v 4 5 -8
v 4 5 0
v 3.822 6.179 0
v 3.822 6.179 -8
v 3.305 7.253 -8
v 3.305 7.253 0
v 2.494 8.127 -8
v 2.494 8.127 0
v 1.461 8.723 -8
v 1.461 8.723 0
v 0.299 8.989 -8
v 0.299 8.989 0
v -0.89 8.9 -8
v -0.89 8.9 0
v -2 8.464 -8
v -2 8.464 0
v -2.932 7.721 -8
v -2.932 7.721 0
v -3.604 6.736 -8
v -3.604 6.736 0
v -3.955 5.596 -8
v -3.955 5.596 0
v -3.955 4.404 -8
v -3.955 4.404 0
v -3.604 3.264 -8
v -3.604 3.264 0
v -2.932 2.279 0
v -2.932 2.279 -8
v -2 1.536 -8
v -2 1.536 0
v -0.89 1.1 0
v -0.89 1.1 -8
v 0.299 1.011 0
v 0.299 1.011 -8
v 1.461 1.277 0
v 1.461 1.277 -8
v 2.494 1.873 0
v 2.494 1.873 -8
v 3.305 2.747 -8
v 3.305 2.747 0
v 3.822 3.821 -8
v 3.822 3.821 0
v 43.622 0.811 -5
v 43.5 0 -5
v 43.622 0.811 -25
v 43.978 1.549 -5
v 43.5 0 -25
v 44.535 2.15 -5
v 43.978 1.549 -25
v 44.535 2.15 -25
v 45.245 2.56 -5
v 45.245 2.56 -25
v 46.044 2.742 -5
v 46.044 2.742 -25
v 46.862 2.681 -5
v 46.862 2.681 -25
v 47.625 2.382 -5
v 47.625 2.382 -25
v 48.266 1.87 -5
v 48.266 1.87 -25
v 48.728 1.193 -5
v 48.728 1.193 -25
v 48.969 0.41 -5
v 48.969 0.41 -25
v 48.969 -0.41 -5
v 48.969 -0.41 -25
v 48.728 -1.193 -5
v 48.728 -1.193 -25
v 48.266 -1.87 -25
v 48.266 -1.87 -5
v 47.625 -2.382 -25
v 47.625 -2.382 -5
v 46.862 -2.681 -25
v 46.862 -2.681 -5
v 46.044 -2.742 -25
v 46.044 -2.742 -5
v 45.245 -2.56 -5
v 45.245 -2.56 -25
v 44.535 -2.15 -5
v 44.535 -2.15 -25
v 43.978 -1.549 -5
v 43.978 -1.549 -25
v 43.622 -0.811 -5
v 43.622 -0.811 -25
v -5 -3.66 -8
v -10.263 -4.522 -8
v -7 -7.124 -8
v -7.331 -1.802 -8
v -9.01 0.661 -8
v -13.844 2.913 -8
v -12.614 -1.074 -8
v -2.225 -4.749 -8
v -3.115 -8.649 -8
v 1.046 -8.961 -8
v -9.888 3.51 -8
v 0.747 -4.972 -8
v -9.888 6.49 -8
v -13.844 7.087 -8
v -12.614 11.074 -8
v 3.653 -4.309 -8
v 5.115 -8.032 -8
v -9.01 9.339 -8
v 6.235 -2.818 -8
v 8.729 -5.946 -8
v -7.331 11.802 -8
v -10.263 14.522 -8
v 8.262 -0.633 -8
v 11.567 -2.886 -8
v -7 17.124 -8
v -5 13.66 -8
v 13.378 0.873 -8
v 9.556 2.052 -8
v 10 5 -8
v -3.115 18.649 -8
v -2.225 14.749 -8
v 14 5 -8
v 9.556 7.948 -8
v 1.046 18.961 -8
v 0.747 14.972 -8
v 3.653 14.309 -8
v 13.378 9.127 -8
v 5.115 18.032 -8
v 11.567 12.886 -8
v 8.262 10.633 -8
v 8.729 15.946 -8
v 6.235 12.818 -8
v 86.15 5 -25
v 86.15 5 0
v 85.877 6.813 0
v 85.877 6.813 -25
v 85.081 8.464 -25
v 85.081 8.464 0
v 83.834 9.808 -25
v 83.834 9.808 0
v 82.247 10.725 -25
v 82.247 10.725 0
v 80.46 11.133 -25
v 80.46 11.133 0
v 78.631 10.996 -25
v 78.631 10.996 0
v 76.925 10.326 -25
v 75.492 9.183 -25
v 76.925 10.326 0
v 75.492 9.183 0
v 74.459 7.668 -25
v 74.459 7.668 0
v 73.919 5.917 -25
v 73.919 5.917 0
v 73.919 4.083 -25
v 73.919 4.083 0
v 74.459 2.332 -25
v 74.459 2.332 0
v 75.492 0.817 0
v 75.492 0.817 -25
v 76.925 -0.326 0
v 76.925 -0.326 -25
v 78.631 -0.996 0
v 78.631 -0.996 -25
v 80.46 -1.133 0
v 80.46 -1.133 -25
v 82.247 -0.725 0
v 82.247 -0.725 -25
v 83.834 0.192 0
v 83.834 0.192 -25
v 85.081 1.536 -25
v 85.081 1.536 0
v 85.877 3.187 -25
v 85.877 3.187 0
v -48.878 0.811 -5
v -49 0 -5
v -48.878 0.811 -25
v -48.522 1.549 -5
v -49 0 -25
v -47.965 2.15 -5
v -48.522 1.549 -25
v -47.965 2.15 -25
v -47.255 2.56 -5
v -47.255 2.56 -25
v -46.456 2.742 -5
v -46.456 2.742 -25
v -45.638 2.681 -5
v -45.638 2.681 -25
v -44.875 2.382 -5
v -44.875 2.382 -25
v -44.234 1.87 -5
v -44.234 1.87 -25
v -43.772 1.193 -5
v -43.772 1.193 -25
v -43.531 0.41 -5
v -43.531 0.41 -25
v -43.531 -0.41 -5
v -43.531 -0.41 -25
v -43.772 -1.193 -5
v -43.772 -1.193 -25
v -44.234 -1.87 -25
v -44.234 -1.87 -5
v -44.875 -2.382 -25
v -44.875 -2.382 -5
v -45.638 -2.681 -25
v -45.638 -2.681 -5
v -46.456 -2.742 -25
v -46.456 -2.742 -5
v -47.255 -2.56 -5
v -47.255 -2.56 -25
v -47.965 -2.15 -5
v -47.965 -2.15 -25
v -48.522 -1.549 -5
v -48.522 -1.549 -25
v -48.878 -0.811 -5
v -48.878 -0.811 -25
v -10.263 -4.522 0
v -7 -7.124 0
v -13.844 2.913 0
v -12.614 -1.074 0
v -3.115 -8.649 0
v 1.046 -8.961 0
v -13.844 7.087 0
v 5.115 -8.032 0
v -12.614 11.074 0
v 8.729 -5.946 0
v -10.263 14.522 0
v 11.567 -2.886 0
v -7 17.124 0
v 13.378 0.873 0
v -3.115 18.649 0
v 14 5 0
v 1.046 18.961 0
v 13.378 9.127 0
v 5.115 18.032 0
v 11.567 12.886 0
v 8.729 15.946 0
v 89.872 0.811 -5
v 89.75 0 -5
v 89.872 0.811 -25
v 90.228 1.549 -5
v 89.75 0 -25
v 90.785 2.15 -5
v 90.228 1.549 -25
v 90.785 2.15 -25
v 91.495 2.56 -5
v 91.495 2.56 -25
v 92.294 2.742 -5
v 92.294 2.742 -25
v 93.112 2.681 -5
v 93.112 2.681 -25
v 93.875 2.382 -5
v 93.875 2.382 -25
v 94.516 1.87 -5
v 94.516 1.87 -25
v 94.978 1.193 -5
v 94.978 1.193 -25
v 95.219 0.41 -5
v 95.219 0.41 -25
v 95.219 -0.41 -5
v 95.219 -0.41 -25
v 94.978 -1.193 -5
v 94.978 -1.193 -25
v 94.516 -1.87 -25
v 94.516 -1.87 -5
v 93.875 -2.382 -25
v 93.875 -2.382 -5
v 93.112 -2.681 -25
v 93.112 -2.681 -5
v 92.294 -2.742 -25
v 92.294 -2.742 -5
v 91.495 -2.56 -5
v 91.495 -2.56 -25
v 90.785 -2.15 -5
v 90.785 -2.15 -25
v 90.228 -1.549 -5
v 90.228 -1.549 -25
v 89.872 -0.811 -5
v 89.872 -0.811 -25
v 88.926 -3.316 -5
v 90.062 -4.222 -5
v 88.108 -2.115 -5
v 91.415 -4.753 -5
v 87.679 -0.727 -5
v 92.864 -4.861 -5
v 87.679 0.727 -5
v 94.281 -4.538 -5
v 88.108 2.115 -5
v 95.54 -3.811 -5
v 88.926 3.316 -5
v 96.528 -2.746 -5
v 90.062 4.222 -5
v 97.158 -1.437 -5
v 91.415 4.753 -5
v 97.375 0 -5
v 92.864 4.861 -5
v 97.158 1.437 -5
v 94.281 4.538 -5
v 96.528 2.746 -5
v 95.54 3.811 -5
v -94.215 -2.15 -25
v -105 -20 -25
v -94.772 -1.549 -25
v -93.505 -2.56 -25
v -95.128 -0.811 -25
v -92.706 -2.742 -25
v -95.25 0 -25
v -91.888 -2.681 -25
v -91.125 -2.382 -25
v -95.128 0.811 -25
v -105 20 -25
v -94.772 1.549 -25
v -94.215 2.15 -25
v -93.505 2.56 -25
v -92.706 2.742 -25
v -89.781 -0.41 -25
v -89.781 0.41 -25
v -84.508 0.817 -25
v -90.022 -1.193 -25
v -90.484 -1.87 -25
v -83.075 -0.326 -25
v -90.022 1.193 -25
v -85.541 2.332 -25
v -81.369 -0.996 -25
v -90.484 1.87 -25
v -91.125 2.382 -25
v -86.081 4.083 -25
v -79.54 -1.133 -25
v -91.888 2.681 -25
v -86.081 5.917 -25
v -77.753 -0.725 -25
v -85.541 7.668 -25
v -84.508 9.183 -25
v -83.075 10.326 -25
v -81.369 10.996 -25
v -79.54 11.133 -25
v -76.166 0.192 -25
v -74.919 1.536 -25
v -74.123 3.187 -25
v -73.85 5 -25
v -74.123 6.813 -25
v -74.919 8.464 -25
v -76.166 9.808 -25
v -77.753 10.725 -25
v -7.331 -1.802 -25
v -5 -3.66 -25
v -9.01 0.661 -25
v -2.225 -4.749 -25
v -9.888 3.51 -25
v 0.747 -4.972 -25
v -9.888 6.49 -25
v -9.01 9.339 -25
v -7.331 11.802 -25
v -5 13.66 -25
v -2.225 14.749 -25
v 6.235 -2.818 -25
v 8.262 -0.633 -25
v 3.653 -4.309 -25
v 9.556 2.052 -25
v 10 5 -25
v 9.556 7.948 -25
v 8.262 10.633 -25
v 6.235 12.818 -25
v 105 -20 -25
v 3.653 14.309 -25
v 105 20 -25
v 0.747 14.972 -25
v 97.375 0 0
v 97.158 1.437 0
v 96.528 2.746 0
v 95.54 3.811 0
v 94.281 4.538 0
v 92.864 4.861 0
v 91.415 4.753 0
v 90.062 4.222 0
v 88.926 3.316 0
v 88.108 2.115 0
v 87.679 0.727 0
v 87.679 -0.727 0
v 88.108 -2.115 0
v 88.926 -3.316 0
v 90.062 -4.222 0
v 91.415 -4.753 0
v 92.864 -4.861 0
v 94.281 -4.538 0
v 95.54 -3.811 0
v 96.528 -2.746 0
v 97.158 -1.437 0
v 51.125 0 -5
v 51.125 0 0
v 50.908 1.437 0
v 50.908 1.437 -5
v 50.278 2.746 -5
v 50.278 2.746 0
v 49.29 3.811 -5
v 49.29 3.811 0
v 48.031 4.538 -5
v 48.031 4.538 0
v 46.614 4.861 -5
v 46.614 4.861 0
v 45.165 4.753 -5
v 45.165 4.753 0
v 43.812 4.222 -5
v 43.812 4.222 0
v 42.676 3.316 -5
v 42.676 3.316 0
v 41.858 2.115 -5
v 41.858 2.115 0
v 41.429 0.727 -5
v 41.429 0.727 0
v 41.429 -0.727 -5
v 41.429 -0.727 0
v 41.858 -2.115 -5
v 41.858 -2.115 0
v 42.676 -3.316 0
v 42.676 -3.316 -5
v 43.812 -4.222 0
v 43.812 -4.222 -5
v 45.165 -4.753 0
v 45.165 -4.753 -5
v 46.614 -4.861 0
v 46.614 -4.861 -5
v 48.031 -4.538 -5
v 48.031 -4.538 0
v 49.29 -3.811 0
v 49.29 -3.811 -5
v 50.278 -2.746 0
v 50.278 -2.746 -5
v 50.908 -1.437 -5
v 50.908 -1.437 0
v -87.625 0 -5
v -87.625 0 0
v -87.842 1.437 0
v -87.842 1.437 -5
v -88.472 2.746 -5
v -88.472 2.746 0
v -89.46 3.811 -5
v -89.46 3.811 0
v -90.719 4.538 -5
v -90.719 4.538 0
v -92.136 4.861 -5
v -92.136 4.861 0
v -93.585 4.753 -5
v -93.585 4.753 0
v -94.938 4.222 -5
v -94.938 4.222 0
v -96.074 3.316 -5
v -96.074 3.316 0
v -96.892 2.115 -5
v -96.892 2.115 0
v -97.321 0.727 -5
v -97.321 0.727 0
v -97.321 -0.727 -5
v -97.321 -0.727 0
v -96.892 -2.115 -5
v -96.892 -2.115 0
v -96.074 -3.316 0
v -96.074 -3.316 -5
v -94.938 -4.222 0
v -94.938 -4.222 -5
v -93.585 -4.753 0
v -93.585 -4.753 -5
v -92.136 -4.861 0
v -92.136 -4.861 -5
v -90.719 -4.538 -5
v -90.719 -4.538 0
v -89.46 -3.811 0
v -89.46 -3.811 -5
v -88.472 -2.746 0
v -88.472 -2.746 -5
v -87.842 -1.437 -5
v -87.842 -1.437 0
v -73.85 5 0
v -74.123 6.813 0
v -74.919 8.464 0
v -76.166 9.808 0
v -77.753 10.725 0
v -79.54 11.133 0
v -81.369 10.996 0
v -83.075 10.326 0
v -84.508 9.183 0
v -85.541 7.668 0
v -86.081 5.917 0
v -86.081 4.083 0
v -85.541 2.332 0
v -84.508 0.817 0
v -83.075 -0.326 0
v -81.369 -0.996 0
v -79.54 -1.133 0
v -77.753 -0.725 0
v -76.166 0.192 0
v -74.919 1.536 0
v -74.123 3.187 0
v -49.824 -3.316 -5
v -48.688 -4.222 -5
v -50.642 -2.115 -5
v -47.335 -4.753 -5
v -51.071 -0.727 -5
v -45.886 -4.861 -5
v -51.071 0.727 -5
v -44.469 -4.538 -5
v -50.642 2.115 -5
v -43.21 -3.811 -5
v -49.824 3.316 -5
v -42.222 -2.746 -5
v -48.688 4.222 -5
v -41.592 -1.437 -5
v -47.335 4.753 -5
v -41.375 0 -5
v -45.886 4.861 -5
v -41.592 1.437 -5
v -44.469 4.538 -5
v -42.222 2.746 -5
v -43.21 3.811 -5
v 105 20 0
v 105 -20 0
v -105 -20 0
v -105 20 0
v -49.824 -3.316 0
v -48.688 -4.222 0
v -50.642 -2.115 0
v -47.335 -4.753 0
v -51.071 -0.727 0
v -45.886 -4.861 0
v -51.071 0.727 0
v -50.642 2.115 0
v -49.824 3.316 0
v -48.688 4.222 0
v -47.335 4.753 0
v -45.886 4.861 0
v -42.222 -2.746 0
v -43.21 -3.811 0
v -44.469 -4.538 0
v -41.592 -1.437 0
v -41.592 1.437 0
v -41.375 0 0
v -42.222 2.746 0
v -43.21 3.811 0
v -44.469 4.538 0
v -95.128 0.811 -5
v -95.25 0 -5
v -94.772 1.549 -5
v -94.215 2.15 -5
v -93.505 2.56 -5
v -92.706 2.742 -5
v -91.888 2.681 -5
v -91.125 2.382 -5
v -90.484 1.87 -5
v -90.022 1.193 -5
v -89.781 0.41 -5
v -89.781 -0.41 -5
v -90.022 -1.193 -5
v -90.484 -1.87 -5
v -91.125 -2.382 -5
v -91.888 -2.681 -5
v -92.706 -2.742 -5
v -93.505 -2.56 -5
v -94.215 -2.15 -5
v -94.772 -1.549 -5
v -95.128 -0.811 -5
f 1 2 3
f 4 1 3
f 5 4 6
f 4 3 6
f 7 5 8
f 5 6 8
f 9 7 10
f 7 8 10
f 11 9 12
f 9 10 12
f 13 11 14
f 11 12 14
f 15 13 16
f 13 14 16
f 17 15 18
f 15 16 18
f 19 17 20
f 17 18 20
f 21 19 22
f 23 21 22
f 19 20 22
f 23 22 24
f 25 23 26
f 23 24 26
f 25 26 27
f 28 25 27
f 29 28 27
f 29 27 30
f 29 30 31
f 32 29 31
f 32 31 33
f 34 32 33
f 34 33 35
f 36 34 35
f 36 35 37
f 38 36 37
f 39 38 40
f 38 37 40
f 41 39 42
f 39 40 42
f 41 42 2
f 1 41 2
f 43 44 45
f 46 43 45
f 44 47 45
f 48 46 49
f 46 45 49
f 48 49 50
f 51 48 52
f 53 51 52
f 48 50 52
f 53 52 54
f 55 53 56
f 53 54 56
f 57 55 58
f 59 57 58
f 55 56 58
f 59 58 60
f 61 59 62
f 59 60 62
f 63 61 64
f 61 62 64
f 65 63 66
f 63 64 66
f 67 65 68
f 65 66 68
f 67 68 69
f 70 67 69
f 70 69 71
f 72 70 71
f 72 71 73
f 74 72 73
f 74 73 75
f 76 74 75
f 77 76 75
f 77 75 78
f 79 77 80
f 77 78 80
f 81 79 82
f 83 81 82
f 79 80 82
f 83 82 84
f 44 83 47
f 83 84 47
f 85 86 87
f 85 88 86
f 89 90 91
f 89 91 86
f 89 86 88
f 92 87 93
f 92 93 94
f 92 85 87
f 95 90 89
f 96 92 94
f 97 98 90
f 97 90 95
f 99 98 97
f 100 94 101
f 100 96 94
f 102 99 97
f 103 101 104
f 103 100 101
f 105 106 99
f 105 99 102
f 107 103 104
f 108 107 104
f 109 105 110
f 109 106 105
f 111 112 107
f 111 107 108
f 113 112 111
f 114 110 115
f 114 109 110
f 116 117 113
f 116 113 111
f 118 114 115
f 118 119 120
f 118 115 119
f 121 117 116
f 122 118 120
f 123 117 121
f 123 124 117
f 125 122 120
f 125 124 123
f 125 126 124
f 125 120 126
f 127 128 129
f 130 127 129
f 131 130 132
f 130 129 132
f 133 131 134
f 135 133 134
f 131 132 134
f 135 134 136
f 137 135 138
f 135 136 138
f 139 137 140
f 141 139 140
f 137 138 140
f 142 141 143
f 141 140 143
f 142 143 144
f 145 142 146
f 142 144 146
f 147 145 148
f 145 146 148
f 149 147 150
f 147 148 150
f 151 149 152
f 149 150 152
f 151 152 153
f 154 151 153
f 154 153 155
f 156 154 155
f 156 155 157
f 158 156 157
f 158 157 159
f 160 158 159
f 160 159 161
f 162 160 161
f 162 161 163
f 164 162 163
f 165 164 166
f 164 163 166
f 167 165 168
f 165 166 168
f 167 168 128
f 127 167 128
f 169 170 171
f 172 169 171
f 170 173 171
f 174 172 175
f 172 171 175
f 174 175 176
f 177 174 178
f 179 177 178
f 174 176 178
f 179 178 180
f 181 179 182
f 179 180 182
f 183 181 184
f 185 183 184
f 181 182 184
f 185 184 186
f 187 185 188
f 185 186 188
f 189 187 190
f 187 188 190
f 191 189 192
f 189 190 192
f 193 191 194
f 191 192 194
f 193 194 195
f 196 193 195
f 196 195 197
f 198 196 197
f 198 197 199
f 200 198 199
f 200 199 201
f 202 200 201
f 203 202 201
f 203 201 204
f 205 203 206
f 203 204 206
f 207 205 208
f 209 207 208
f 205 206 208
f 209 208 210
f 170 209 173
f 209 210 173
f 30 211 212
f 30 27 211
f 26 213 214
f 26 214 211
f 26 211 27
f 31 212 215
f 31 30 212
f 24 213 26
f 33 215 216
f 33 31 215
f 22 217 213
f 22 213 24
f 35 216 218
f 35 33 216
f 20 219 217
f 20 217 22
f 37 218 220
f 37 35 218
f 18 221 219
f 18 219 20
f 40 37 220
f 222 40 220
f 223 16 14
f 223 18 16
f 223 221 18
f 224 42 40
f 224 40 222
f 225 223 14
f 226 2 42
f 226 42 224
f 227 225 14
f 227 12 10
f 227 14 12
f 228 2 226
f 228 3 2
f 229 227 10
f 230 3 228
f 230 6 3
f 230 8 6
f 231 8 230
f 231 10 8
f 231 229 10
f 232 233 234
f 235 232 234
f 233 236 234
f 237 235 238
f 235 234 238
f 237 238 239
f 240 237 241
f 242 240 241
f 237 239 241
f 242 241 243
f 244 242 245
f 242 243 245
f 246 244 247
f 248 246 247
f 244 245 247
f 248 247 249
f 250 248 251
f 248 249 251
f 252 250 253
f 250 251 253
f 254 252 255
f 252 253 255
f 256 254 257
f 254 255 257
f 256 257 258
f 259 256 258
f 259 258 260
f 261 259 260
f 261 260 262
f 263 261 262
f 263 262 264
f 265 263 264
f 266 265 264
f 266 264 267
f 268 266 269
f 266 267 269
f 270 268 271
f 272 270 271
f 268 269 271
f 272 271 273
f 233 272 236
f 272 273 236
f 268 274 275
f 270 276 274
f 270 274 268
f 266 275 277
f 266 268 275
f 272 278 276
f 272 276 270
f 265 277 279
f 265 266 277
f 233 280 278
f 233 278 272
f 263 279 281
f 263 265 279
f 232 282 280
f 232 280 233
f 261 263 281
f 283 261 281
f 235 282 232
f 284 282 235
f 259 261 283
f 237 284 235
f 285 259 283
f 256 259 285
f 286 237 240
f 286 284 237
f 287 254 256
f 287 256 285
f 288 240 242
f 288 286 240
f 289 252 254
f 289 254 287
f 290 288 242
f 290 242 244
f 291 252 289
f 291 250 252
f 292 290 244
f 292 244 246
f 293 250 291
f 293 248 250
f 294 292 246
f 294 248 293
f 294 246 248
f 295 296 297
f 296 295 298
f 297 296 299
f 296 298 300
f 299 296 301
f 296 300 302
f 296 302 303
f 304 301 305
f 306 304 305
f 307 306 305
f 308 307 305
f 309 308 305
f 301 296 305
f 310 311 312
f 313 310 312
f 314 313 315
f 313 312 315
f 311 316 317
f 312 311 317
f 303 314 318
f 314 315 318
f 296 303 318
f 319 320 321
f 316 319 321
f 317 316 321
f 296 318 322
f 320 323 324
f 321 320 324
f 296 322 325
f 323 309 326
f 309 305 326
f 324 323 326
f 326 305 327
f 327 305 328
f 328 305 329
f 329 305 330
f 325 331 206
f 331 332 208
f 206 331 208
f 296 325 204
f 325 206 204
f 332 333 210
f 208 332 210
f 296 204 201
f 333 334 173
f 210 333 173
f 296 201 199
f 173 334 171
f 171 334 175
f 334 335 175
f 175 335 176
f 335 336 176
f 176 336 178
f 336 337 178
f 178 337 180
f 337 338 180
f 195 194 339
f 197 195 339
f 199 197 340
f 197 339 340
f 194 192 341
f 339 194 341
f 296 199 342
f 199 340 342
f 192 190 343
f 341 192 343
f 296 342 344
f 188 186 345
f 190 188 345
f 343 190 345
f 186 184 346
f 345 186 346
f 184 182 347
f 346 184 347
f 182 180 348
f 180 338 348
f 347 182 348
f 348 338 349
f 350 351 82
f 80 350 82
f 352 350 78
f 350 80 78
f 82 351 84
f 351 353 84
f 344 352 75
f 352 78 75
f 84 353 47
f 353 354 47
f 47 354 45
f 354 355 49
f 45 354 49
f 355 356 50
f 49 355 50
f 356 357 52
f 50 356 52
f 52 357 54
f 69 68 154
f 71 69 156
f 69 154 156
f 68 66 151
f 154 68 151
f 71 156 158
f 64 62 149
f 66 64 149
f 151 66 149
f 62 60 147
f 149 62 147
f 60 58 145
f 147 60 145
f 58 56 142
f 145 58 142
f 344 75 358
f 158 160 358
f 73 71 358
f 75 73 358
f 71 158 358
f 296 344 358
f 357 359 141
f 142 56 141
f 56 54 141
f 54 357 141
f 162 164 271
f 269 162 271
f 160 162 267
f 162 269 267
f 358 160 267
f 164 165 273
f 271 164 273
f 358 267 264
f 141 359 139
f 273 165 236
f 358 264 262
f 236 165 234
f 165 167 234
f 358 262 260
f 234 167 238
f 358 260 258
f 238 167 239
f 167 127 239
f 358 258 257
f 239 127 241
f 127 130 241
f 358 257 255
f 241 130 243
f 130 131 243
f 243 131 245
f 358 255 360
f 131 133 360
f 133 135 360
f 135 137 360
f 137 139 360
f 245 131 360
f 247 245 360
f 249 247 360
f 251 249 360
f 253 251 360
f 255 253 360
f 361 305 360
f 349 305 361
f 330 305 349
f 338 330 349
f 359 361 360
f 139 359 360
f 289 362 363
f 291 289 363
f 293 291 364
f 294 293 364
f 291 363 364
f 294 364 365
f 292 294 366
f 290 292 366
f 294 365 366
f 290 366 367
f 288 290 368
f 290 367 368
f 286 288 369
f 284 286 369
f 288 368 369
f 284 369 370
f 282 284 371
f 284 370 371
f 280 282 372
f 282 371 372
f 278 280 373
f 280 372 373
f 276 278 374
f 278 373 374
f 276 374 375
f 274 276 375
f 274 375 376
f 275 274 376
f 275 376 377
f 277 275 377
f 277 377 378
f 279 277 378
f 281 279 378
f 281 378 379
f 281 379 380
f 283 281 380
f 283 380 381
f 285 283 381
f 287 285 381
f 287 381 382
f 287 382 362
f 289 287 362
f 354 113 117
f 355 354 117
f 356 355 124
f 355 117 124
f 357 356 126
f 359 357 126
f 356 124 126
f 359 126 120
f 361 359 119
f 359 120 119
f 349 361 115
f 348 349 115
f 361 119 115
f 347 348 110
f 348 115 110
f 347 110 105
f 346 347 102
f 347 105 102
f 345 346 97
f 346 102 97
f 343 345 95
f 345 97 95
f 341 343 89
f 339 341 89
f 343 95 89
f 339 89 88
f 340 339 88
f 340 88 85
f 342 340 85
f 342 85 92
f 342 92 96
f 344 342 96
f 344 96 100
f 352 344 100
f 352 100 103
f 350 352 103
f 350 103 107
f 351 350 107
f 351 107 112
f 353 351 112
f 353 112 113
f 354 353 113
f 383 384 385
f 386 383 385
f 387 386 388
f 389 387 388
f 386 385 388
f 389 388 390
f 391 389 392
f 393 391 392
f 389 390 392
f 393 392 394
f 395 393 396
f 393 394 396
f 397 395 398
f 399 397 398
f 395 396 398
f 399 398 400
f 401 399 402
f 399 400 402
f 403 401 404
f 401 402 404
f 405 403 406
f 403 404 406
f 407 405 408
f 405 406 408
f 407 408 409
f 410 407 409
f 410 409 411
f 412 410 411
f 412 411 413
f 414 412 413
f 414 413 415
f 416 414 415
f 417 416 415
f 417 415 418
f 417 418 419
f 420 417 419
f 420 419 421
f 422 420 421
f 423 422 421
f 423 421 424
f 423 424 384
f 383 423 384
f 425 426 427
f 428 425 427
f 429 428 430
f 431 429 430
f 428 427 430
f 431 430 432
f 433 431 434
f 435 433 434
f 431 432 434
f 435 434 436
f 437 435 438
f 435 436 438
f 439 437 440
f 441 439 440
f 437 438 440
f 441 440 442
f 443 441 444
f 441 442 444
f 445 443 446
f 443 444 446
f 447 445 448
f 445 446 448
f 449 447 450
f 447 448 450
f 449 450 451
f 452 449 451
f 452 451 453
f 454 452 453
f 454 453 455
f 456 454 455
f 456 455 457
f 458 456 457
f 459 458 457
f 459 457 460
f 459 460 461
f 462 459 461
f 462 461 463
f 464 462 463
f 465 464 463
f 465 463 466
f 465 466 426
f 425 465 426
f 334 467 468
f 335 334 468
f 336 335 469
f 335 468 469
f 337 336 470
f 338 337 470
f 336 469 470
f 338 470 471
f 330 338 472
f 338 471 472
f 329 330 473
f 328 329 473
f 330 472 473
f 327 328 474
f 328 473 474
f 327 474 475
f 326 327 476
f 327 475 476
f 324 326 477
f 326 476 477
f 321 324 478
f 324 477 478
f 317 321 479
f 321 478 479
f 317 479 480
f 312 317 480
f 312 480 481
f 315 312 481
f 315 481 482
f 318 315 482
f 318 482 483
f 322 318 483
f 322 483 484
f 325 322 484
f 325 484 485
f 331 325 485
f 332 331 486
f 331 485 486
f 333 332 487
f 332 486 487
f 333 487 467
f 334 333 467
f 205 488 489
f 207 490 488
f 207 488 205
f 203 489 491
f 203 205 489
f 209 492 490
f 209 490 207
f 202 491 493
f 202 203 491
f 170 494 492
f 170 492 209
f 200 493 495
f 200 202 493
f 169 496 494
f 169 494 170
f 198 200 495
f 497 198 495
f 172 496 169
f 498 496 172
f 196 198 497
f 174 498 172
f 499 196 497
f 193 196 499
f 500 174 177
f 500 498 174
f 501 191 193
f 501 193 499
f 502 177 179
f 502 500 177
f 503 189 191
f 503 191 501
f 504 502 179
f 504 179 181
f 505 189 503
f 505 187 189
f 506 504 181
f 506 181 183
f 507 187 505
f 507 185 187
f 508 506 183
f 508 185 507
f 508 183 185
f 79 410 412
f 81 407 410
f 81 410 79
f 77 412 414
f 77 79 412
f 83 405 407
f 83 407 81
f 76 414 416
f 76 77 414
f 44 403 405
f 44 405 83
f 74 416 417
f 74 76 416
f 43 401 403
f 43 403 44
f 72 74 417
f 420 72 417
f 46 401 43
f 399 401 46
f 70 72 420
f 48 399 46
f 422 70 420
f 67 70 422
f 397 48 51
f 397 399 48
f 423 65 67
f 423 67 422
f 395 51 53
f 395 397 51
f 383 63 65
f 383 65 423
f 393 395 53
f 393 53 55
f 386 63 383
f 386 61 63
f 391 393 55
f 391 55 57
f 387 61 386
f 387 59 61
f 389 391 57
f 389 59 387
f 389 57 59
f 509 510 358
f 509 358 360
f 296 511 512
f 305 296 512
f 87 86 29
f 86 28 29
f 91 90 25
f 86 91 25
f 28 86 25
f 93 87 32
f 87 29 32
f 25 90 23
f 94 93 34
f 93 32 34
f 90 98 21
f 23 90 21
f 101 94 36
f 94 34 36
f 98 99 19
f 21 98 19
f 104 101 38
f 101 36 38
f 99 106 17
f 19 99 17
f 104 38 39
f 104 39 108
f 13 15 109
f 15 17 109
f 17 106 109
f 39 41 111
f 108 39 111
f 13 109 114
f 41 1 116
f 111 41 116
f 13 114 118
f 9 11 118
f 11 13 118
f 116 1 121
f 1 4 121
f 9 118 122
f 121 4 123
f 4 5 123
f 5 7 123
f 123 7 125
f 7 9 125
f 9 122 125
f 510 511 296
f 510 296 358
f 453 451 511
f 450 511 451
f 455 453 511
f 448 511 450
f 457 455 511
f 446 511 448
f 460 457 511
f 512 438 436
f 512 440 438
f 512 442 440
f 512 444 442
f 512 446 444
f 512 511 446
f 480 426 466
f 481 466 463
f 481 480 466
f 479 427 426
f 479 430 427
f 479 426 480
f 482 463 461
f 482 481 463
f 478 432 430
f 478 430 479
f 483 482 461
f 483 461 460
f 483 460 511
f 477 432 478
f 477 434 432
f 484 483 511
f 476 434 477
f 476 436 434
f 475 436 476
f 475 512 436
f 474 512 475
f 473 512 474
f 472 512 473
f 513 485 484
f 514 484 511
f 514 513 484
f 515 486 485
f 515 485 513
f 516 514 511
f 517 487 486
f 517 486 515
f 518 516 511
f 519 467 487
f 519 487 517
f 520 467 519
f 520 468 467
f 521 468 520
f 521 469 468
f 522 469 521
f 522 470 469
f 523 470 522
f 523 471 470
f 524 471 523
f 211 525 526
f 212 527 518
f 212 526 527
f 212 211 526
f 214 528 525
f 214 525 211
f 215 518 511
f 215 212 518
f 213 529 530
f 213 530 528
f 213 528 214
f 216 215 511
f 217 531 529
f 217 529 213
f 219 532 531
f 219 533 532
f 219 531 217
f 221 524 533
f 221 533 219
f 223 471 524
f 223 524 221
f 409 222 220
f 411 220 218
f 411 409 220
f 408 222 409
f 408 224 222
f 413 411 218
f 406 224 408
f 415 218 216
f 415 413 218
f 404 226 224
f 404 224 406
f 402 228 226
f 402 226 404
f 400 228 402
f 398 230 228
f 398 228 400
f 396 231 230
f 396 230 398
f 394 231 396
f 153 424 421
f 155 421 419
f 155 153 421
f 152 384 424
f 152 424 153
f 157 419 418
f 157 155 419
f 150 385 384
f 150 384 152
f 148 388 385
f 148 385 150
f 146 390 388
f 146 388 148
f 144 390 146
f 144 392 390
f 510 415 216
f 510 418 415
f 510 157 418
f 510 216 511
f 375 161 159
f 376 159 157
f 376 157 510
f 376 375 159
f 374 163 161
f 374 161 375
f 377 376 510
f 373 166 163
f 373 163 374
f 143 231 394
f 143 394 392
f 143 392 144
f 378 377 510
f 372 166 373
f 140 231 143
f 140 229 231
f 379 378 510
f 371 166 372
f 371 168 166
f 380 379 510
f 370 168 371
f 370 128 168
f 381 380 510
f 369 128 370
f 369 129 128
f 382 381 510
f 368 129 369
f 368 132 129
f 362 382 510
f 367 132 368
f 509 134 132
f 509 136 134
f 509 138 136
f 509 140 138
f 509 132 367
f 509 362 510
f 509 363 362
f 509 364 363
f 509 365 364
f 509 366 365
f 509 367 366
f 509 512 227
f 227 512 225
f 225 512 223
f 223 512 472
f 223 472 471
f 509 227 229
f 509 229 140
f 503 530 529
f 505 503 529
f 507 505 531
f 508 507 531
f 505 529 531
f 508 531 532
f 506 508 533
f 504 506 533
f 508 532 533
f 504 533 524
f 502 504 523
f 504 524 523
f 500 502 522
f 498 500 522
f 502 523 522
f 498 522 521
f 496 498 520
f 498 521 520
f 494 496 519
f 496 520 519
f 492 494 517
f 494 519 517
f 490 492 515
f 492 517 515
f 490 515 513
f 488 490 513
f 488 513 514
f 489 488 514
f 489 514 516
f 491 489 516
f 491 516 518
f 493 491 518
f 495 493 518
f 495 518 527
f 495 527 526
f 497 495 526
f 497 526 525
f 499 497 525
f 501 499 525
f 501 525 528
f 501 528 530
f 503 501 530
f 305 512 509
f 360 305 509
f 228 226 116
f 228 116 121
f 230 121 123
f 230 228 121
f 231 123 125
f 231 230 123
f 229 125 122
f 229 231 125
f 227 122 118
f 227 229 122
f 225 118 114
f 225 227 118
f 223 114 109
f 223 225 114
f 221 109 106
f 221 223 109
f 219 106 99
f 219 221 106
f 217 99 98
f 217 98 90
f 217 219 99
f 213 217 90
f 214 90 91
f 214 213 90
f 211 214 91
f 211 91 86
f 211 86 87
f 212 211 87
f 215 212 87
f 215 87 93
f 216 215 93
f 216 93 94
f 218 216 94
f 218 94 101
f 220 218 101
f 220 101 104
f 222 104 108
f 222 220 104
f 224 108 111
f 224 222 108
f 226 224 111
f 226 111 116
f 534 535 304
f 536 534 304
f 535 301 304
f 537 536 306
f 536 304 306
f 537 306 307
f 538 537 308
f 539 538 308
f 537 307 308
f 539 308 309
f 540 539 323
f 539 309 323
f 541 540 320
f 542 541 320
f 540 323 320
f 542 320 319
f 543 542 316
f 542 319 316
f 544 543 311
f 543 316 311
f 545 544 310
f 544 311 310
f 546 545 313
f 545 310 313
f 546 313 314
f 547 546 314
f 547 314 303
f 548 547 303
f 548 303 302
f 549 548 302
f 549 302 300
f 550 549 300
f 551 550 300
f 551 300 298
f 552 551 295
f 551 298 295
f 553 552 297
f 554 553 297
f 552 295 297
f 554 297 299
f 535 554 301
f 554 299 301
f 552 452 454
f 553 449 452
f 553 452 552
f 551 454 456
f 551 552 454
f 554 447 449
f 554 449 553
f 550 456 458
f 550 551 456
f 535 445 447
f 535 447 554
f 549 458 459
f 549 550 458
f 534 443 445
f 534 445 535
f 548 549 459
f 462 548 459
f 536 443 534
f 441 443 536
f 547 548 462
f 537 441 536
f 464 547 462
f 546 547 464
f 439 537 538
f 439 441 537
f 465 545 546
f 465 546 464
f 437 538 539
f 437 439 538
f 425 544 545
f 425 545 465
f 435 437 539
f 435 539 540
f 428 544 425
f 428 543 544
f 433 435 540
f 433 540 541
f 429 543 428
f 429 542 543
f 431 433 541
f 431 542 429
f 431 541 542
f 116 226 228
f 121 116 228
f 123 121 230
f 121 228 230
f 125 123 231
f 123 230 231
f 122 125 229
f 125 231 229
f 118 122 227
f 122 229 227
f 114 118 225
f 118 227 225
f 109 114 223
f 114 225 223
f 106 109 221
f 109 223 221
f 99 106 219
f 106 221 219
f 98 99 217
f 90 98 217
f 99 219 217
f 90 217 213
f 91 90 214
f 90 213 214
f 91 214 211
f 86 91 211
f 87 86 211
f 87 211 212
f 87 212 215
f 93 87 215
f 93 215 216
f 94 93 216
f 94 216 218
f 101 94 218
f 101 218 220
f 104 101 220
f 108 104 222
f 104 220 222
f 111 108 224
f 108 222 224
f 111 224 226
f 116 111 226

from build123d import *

# Parameters (mm, degrees)
F0_W           = 210
F0_H           = 40
F0_R           = 6.15
F0_R_2         = 14
F0_R_3         = 10
F1_DEPTH       = 25
F2_DEPTH       = 8
F3_D           = 5.5
F3_CBORE_D     = 9.75
F3_CBORE_DEPTH = 5
F0_R_4         = 4
F4_DEPTH       = 8


with BuildPart() as f1:
    # F0 (on Top) → F1 (new body)
    with BuildSketch(Plane.XY):
        Rectangle(F0_W, F0_H)
        with Locations((-80, 5)):
            Circle(F0_R, mode=Mode.SUBTRACT)
        with Locations((0, 5)):
            Circle(F0_R_2, mode=Mode.SUBTRACT)
        with Locations((80, 5)):
            Circle(F0_R, mode=Mode.SUBTRACT)
        with Locations((0, 5)):
            Circle(F0_R_2)
        with Locations((0, 5)):
            Circle(F0_R_3, mode=Mode.SUBTRACT)
    extrude(amount=-F1_DEPTH)

    # F0 (on Top) → F2 (cut)
    with BuildSketch(Plane.XY):
        with Locations((0, 5)):
            Circle(F0_R_2)
        with Locations((0, 5)):
            Circle(F0_R_3, mode=Mode.SUBTRACT)
    extrude(amount=-F2_DEPTH, mode=Mode.SUBTRACT)

    # F3 (through all)
    with Locations(Plane.XY):
        with Locations((-92.5, 0), (-46.25, 0), (46.25, 0), (92.5, 0)):
            CounterBoreHole(F3_D / 2, F3_CBORE_D / 2, F3_CBORE_DEPTH)


with BuildPart() as f4:
    # F0 (on Top) → F4 (new body)
    with BuildSketch(Plane.XY):
        with Locations((0, 5)):
            Circle(F0_R_2)
        with Locations((0, 5)):
            Circle(F0_R_3, mode=Mode.SUBTRACT)
        with Locations((0, 5)):
            Circle(F0_R_3)
        with Locations((0, 5)):
            Circle(F0_R_4, mode=Mode.SUBTRACT)
    extrude(amount=-F4_DEPTH)


solid = Compound([f1.part, f4.part])
